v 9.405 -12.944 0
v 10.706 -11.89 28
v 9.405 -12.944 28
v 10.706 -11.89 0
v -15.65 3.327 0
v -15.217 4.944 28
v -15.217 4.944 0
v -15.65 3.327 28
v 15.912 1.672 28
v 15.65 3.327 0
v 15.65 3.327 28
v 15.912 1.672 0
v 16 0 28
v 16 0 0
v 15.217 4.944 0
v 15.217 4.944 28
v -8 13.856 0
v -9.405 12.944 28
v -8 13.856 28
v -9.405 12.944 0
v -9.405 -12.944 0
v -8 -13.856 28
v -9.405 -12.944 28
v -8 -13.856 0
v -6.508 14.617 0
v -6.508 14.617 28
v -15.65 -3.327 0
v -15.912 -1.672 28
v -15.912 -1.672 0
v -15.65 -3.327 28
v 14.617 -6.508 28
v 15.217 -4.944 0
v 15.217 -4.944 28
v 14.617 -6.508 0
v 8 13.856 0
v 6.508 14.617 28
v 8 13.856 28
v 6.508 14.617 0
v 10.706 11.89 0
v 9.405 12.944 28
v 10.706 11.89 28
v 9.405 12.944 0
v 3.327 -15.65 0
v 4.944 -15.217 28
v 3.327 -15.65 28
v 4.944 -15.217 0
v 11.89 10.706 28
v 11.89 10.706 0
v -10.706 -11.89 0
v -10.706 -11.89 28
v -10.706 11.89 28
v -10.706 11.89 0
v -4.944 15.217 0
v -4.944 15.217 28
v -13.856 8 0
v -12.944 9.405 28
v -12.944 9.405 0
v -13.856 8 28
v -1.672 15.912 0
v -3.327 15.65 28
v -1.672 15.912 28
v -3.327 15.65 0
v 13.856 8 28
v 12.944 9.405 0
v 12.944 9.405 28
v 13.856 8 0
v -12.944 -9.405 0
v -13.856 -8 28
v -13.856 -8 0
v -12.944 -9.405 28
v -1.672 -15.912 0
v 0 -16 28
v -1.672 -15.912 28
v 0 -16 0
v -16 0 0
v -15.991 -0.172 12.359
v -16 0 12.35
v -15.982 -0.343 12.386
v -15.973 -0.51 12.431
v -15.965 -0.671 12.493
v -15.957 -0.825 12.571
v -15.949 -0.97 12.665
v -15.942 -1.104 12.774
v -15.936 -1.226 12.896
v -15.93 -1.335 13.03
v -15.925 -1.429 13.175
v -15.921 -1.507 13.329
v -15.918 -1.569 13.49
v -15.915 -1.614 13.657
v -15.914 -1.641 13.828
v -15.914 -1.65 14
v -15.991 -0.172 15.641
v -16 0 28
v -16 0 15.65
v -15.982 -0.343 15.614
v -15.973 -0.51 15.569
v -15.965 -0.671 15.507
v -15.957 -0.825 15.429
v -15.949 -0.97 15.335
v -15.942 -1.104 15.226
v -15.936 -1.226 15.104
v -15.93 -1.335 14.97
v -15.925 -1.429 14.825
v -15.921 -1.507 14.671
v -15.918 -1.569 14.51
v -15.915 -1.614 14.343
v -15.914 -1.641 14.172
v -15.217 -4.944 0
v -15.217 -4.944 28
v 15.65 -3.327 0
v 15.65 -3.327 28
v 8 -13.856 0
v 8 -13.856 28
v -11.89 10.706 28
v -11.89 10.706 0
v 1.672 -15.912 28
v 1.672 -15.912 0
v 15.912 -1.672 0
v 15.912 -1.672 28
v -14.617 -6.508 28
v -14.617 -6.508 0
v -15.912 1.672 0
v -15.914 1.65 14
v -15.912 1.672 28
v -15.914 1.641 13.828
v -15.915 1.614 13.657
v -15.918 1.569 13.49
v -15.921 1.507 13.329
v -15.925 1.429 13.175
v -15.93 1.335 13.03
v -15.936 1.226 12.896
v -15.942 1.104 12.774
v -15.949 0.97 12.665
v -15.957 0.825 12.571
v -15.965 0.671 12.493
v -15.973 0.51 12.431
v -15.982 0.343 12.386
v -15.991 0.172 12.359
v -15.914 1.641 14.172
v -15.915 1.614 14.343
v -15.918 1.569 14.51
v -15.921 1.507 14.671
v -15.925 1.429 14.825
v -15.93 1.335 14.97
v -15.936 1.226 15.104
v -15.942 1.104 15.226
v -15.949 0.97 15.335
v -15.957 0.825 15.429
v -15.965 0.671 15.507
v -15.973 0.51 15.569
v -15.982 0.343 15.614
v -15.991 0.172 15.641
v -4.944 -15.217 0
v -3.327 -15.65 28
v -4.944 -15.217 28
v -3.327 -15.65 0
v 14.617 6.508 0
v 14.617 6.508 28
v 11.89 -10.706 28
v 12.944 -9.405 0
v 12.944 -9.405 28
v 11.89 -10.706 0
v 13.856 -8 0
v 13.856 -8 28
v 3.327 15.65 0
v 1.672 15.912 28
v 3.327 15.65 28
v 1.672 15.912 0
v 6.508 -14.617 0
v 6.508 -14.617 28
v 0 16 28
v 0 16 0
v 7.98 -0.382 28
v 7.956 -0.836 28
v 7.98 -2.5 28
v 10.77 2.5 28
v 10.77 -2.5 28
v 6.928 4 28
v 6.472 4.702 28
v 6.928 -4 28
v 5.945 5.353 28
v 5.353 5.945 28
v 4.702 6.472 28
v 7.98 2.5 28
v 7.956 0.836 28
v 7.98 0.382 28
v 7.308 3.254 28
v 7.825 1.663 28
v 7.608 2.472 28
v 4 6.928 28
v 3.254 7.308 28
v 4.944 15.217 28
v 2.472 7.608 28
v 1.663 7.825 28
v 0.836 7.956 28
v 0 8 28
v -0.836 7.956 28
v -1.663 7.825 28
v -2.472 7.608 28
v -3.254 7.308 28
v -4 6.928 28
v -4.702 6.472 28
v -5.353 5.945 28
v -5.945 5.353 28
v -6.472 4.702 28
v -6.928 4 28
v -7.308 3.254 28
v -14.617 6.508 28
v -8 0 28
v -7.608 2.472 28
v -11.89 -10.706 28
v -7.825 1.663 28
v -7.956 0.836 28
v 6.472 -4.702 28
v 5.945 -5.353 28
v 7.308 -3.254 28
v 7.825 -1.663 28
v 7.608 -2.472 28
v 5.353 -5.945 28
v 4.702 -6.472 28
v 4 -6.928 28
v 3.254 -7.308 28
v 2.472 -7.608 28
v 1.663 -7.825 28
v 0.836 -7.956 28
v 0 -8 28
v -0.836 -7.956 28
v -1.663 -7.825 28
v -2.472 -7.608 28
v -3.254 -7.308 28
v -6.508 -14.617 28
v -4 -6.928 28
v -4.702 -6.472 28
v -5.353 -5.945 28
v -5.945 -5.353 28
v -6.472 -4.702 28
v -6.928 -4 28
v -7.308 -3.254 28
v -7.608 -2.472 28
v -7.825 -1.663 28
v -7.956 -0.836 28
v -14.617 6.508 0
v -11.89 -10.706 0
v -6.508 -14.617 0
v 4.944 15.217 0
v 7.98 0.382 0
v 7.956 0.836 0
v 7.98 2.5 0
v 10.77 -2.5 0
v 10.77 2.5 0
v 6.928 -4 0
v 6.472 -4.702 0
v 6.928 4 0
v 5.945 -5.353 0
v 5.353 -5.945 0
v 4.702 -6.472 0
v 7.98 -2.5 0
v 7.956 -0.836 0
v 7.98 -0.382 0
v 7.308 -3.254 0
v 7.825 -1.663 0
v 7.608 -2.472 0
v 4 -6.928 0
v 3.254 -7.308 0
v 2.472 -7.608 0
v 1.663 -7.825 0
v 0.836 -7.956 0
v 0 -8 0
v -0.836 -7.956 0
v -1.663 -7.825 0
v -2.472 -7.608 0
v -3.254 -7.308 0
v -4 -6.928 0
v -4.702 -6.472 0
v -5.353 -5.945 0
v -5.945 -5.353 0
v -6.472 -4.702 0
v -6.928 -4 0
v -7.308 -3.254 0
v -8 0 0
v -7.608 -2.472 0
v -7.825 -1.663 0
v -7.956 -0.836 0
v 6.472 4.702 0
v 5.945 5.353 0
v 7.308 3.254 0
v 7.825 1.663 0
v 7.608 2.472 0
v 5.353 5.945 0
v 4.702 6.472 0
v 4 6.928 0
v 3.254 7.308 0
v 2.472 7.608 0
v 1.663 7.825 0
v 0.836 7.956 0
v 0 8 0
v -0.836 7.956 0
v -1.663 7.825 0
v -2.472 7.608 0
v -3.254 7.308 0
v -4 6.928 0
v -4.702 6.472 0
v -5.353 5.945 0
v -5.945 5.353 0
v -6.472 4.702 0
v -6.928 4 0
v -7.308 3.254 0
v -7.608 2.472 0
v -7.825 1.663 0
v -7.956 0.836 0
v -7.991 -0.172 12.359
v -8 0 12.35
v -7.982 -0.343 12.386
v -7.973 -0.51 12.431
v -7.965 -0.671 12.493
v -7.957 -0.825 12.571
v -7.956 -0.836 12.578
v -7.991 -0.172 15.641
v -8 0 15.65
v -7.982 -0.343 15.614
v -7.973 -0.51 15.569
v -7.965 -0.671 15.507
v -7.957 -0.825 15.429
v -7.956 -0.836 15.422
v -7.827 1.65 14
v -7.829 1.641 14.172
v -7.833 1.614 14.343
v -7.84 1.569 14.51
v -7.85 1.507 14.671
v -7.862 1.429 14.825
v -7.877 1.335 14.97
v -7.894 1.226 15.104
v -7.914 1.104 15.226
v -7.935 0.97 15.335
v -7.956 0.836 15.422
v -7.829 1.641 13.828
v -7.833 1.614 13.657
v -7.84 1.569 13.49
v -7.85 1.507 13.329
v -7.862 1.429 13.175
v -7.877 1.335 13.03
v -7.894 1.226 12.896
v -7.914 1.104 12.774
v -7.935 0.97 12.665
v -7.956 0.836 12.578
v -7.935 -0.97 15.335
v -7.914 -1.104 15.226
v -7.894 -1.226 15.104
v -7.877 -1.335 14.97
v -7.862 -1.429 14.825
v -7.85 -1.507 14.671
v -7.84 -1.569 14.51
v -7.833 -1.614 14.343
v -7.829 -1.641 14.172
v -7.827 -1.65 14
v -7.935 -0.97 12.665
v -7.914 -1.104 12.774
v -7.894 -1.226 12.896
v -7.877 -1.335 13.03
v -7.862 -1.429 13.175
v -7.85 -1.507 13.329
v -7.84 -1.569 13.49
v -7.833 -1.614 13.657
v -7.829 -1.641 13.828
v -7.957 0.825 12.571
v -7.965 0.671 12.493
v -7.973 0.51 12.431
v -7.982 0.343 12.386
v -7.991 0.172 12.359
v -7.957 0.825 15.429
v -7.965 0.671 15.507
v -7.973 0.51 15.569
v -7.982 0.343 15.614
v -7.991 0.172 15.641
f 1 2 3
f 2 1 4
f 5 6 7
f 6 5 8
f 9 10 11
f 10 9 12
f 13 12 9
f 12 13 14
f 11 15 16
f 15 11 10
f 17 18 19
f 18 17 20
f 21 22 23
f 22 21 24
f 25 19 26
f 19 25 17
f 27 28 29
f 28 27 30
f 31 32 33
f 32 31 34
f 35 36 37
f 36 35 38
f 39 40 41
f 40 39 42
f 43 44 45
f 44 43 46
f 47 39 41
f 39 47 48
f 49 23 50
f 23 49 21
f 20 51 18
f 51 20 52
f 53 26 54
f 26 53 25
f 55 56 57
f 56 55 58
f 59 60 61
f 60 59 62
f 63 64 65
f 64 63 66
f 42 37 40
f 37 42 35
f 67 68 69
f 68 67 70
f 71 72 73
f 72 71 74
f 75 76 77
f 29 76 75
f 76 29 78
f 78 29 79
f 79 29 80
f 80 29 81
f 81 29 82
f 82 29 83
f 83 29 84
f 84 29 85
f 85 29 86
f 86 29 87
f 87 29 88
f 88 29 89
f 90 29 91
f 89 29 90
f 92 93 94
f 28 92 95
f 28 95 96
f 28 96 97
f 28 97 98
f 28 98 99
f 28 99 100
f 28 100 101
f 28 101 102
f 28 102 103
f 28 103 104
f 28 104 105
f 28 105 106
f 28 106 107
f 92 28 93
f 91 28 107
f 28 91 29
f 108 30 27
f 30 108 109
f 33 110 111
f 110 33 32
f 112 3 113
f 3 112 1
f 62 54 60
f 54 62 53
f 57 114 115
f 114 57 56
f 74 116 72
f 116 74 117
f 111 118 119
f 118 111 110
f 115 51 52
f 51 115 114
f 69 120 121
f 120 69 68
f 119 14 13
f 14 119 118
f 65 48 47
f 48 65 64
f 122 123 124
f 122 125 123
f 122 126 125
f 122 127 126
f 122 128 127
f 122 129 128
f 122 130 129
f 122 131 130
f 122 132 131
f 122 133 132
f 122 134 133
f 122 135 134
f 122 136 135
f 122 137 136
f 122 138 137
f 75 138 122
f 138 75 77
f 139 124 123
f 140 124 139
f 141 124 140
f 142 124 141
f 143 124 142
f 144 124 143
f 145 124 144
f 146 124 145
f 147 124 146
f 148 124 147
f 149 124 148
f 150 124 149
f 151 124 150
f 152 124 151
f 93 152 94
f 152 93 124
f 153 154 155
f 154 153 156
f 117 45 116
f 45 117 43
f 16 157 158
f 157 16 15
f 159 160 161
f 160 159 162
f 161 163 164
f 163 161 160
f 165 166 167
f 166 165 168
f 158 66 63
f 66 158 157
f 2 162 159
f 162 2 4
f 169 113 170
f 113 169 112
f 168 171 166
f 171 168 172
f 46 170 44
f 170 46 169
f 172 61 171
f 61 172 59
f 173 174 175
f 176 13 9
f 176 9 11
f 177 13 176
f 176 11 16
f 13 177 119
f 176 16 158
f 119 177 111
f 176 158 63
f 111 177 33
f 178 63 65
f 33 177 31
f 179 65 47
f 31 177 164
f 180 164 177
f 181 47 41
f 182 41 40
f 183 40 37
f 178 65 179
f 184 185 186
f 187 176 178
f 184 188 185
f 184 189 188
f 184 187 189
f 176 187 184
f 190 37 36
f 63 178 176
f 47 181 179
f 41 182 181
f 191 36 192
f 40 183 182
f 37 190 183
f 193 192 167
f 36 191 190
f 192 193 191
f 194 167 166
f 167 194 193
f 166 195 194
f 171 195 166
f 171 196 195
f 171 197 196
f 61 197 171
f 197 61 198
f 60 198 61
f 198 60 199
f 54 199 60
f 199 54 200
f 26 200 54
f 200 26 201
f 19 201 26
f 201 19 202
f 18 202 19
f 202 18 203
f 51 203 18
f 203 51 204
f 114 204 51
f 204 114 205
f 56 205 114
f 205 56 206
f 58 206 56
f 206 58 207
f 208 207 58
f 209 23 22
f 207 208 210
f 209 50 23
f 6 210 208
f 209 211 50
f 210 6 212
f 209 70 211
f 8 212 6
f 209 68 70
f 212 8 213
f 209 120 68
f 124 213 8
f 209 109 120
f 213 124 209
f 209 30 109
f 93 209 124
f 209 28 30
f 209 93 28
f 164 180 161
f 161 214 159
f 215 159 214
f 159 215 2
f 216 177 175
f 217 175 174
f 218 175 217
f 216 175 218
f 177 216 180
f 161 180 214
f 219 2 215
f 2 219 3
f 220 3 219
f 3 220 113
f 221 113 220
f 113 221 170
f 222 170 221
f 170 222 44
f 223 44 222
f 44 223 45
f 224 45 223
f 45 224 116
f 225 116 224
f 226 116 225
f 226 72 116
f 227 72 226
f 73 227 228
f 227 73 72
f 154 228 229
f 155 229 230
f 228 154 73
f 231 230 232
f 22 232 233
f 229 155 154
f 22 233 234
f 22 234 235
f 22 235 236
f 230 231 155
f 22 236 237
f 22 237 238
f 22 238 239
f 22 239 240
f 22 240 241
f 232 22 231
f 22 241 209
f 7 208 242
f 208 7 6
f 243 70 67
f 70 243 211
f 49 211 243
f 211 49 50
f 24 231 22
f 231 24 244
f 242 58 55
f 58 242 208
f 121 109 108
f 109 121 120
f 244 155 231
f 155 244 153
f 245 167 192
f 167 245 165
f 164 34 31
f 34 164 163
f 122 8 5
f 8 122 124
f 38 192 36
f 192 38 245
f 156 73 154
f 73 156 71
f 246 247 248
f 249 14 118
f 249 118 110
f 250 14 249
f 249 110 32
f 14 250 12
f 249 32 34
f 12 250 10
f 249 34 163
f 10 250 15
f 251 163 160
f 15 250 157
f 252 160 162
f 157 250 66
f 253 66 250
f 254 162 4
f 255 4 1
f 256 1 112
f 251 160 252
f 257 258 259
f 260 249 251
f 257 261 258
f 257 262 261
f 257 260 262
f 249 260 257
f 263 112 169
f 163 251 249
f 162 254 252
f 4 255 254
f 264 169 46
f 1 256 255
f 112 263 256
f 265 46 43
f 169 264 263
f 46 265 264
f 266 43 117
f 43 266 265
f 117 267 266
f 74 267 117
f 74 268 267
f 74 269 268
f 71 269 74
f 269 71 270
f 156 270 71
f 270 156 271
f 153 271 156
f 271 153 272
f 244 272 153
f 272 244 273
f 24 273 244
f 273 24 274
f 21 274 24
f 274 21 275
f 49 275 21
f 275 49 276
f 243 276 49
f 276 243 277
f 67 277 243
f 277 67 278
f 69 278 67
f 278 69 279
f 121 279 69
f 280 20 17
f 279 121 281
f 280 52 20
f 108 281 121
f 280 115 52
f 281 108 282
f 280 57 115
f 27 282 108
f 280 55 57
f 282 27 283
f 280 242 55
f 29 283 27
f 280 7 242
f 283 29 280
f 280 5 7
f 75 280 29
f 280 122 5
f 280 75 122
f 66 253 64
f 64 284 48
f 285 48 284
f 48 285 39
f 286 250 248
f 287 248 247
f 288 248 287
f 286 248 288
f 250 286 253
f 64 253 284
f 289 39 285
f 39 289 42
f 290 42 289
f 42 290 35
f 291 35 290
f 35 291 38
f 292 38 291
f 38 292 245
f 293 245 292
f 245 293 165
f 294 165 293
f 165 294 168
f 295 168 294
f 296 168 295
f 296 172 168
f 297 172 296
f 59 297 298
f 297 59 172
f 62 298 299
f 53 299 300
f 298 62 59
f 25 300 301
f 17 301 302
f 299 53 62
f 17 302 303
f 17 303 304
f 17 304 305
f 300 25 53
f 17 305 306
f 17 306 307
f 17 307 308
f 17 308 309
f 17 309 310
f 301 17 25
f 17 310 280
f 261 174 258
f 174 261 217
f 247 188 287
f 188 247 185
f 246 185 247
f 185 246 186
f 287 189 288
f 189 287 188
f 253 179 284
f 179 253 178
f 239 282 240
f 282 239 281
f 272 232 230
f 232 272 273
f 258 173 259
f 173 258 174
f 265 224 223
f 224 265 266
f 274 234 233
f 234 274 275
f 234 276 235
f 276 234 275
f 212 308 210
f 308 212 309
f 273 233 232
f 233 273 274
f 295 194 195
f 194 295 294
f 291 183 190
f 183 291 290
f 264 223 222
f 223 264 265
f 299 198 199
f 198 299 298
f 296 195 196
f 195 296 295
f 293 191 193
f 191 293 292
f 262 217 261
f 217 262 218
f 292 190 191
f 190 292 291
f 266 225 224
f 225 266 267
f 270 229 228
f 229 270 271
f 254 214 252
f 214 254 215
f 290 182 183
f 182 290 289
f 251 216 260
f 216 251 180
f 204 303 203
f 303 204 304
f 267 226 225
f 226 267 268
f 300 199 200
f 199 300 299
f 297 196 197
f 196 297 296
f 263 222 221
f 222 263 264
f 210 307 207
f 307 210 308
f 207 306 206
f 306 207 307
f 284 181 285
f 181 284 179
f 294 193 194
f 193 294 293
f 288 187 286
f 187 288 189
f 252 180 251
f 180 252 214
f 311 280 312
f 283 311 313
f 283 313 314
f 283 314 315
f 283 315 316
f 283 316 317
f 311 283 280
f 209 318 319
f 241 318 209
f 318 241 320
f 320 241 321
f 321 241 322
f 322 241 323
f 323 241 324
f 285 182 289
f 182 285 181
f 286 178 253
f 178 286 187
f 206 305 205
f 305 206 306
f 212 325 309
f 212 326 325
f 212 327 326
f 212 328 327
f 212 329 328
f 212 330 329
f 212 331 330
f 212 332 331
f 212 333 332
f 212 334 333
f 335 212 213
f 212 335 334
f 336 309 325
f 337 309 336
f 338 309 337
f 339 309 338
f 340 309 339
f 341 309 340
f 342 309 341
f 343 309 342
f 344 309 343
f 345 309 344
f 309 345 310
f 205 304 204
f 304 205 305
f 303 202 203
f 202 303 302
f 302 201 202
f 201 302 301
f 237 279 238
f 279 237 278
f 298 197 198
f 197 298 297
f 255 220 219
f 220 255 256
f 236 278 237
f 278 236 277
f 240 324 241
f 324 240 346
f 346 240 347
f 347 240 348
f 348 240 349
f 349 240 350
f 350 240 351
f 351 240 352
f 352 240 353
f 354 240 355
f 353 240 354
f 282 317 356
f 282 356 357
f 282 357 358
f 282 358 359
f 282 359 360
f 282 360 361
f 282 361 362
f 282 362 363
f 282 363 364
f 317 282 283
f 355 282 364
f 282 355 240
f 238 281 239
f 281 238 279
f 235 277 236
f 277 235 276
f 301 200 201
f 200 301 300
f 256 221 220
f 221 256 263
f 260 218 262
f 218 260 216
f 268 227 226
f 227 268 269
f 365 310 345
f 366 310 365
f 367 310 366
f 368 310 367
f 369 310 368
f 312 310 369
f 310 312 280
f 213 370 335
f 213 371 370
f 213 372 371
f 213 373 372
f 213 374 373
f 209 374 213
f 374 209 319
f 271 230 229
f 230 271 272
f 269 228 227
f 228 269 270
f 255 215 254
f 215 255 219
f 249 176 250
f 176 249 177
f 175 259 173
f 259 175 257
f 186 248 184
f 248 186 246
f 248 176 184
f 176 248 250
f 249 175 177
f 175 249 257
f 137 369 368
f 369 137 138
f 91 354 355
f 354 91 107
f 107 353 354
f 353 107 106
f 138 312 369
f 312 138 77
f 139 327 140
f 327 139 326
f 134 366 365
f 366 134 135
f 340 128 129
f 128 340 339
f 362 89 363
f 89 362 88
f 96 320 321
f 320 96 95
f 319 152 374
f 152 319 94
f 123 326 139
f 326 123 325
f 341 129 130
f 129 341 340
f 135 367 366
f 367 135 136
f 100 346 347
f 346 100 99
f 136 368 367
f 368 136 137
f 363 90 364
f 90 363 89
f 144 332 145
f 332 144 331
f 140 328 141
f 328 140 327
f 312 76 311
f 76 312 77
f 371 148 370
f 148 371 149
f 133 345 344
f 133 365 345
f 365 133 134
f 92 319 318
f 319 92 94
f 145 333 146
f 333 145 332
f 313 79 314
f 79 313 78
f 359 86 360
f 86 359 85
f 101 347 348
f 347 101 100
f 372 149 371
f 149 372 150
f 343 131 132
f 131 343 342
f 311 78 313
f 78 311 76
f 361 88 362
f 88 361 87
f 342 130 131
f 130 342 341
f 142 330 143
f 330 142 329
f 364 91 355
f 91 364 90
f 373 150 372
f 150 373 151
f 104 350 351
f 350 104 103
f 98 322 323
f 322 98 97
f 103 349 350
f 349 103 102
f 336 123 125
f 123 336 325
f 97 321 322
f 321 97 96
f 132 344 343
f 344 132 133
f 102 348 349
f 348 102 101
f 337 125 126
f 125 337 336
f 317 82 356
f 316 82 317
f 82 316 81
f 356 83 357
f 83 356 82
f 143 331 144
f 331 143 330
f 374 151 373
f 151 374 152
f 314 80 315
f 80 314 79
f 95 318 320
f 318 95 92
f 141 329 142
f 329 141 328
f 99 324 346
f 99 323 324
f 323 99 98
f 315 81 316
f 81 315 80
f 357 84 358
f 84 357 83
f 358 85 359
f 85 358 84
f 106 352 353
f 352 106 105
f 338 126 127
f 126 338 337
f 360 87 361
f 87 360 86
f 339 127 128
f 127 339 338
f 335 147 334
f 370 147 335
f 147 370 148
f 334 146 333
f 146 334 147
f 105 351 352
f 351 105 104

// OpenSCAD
// Keyway hub for a 16 mm shaft.
$fn = 60;
eps = 0.02;
shaft_d = 16;
outer_d = 32;
length = 28;
key_w = 5;
key_depth = 2.75;
difference() {
    cylinder(d = outer_d, h = length);
    translate([0, 0, -eps]) cylinder(d = shaft_d, h = length + 2 * eps);
    translate([shaft_d / 2 - eps, -key_w / 2, -eps]) cube([key_depth + 2 * eps, key_w, length + 2 * eps]);
    translate([-outer_d / 2 - eps, 0, length / 2]) rotate([0, 90, 0]) cylinder(d = 3.3, h = outer_d / 2 + 2 * eps);
}
